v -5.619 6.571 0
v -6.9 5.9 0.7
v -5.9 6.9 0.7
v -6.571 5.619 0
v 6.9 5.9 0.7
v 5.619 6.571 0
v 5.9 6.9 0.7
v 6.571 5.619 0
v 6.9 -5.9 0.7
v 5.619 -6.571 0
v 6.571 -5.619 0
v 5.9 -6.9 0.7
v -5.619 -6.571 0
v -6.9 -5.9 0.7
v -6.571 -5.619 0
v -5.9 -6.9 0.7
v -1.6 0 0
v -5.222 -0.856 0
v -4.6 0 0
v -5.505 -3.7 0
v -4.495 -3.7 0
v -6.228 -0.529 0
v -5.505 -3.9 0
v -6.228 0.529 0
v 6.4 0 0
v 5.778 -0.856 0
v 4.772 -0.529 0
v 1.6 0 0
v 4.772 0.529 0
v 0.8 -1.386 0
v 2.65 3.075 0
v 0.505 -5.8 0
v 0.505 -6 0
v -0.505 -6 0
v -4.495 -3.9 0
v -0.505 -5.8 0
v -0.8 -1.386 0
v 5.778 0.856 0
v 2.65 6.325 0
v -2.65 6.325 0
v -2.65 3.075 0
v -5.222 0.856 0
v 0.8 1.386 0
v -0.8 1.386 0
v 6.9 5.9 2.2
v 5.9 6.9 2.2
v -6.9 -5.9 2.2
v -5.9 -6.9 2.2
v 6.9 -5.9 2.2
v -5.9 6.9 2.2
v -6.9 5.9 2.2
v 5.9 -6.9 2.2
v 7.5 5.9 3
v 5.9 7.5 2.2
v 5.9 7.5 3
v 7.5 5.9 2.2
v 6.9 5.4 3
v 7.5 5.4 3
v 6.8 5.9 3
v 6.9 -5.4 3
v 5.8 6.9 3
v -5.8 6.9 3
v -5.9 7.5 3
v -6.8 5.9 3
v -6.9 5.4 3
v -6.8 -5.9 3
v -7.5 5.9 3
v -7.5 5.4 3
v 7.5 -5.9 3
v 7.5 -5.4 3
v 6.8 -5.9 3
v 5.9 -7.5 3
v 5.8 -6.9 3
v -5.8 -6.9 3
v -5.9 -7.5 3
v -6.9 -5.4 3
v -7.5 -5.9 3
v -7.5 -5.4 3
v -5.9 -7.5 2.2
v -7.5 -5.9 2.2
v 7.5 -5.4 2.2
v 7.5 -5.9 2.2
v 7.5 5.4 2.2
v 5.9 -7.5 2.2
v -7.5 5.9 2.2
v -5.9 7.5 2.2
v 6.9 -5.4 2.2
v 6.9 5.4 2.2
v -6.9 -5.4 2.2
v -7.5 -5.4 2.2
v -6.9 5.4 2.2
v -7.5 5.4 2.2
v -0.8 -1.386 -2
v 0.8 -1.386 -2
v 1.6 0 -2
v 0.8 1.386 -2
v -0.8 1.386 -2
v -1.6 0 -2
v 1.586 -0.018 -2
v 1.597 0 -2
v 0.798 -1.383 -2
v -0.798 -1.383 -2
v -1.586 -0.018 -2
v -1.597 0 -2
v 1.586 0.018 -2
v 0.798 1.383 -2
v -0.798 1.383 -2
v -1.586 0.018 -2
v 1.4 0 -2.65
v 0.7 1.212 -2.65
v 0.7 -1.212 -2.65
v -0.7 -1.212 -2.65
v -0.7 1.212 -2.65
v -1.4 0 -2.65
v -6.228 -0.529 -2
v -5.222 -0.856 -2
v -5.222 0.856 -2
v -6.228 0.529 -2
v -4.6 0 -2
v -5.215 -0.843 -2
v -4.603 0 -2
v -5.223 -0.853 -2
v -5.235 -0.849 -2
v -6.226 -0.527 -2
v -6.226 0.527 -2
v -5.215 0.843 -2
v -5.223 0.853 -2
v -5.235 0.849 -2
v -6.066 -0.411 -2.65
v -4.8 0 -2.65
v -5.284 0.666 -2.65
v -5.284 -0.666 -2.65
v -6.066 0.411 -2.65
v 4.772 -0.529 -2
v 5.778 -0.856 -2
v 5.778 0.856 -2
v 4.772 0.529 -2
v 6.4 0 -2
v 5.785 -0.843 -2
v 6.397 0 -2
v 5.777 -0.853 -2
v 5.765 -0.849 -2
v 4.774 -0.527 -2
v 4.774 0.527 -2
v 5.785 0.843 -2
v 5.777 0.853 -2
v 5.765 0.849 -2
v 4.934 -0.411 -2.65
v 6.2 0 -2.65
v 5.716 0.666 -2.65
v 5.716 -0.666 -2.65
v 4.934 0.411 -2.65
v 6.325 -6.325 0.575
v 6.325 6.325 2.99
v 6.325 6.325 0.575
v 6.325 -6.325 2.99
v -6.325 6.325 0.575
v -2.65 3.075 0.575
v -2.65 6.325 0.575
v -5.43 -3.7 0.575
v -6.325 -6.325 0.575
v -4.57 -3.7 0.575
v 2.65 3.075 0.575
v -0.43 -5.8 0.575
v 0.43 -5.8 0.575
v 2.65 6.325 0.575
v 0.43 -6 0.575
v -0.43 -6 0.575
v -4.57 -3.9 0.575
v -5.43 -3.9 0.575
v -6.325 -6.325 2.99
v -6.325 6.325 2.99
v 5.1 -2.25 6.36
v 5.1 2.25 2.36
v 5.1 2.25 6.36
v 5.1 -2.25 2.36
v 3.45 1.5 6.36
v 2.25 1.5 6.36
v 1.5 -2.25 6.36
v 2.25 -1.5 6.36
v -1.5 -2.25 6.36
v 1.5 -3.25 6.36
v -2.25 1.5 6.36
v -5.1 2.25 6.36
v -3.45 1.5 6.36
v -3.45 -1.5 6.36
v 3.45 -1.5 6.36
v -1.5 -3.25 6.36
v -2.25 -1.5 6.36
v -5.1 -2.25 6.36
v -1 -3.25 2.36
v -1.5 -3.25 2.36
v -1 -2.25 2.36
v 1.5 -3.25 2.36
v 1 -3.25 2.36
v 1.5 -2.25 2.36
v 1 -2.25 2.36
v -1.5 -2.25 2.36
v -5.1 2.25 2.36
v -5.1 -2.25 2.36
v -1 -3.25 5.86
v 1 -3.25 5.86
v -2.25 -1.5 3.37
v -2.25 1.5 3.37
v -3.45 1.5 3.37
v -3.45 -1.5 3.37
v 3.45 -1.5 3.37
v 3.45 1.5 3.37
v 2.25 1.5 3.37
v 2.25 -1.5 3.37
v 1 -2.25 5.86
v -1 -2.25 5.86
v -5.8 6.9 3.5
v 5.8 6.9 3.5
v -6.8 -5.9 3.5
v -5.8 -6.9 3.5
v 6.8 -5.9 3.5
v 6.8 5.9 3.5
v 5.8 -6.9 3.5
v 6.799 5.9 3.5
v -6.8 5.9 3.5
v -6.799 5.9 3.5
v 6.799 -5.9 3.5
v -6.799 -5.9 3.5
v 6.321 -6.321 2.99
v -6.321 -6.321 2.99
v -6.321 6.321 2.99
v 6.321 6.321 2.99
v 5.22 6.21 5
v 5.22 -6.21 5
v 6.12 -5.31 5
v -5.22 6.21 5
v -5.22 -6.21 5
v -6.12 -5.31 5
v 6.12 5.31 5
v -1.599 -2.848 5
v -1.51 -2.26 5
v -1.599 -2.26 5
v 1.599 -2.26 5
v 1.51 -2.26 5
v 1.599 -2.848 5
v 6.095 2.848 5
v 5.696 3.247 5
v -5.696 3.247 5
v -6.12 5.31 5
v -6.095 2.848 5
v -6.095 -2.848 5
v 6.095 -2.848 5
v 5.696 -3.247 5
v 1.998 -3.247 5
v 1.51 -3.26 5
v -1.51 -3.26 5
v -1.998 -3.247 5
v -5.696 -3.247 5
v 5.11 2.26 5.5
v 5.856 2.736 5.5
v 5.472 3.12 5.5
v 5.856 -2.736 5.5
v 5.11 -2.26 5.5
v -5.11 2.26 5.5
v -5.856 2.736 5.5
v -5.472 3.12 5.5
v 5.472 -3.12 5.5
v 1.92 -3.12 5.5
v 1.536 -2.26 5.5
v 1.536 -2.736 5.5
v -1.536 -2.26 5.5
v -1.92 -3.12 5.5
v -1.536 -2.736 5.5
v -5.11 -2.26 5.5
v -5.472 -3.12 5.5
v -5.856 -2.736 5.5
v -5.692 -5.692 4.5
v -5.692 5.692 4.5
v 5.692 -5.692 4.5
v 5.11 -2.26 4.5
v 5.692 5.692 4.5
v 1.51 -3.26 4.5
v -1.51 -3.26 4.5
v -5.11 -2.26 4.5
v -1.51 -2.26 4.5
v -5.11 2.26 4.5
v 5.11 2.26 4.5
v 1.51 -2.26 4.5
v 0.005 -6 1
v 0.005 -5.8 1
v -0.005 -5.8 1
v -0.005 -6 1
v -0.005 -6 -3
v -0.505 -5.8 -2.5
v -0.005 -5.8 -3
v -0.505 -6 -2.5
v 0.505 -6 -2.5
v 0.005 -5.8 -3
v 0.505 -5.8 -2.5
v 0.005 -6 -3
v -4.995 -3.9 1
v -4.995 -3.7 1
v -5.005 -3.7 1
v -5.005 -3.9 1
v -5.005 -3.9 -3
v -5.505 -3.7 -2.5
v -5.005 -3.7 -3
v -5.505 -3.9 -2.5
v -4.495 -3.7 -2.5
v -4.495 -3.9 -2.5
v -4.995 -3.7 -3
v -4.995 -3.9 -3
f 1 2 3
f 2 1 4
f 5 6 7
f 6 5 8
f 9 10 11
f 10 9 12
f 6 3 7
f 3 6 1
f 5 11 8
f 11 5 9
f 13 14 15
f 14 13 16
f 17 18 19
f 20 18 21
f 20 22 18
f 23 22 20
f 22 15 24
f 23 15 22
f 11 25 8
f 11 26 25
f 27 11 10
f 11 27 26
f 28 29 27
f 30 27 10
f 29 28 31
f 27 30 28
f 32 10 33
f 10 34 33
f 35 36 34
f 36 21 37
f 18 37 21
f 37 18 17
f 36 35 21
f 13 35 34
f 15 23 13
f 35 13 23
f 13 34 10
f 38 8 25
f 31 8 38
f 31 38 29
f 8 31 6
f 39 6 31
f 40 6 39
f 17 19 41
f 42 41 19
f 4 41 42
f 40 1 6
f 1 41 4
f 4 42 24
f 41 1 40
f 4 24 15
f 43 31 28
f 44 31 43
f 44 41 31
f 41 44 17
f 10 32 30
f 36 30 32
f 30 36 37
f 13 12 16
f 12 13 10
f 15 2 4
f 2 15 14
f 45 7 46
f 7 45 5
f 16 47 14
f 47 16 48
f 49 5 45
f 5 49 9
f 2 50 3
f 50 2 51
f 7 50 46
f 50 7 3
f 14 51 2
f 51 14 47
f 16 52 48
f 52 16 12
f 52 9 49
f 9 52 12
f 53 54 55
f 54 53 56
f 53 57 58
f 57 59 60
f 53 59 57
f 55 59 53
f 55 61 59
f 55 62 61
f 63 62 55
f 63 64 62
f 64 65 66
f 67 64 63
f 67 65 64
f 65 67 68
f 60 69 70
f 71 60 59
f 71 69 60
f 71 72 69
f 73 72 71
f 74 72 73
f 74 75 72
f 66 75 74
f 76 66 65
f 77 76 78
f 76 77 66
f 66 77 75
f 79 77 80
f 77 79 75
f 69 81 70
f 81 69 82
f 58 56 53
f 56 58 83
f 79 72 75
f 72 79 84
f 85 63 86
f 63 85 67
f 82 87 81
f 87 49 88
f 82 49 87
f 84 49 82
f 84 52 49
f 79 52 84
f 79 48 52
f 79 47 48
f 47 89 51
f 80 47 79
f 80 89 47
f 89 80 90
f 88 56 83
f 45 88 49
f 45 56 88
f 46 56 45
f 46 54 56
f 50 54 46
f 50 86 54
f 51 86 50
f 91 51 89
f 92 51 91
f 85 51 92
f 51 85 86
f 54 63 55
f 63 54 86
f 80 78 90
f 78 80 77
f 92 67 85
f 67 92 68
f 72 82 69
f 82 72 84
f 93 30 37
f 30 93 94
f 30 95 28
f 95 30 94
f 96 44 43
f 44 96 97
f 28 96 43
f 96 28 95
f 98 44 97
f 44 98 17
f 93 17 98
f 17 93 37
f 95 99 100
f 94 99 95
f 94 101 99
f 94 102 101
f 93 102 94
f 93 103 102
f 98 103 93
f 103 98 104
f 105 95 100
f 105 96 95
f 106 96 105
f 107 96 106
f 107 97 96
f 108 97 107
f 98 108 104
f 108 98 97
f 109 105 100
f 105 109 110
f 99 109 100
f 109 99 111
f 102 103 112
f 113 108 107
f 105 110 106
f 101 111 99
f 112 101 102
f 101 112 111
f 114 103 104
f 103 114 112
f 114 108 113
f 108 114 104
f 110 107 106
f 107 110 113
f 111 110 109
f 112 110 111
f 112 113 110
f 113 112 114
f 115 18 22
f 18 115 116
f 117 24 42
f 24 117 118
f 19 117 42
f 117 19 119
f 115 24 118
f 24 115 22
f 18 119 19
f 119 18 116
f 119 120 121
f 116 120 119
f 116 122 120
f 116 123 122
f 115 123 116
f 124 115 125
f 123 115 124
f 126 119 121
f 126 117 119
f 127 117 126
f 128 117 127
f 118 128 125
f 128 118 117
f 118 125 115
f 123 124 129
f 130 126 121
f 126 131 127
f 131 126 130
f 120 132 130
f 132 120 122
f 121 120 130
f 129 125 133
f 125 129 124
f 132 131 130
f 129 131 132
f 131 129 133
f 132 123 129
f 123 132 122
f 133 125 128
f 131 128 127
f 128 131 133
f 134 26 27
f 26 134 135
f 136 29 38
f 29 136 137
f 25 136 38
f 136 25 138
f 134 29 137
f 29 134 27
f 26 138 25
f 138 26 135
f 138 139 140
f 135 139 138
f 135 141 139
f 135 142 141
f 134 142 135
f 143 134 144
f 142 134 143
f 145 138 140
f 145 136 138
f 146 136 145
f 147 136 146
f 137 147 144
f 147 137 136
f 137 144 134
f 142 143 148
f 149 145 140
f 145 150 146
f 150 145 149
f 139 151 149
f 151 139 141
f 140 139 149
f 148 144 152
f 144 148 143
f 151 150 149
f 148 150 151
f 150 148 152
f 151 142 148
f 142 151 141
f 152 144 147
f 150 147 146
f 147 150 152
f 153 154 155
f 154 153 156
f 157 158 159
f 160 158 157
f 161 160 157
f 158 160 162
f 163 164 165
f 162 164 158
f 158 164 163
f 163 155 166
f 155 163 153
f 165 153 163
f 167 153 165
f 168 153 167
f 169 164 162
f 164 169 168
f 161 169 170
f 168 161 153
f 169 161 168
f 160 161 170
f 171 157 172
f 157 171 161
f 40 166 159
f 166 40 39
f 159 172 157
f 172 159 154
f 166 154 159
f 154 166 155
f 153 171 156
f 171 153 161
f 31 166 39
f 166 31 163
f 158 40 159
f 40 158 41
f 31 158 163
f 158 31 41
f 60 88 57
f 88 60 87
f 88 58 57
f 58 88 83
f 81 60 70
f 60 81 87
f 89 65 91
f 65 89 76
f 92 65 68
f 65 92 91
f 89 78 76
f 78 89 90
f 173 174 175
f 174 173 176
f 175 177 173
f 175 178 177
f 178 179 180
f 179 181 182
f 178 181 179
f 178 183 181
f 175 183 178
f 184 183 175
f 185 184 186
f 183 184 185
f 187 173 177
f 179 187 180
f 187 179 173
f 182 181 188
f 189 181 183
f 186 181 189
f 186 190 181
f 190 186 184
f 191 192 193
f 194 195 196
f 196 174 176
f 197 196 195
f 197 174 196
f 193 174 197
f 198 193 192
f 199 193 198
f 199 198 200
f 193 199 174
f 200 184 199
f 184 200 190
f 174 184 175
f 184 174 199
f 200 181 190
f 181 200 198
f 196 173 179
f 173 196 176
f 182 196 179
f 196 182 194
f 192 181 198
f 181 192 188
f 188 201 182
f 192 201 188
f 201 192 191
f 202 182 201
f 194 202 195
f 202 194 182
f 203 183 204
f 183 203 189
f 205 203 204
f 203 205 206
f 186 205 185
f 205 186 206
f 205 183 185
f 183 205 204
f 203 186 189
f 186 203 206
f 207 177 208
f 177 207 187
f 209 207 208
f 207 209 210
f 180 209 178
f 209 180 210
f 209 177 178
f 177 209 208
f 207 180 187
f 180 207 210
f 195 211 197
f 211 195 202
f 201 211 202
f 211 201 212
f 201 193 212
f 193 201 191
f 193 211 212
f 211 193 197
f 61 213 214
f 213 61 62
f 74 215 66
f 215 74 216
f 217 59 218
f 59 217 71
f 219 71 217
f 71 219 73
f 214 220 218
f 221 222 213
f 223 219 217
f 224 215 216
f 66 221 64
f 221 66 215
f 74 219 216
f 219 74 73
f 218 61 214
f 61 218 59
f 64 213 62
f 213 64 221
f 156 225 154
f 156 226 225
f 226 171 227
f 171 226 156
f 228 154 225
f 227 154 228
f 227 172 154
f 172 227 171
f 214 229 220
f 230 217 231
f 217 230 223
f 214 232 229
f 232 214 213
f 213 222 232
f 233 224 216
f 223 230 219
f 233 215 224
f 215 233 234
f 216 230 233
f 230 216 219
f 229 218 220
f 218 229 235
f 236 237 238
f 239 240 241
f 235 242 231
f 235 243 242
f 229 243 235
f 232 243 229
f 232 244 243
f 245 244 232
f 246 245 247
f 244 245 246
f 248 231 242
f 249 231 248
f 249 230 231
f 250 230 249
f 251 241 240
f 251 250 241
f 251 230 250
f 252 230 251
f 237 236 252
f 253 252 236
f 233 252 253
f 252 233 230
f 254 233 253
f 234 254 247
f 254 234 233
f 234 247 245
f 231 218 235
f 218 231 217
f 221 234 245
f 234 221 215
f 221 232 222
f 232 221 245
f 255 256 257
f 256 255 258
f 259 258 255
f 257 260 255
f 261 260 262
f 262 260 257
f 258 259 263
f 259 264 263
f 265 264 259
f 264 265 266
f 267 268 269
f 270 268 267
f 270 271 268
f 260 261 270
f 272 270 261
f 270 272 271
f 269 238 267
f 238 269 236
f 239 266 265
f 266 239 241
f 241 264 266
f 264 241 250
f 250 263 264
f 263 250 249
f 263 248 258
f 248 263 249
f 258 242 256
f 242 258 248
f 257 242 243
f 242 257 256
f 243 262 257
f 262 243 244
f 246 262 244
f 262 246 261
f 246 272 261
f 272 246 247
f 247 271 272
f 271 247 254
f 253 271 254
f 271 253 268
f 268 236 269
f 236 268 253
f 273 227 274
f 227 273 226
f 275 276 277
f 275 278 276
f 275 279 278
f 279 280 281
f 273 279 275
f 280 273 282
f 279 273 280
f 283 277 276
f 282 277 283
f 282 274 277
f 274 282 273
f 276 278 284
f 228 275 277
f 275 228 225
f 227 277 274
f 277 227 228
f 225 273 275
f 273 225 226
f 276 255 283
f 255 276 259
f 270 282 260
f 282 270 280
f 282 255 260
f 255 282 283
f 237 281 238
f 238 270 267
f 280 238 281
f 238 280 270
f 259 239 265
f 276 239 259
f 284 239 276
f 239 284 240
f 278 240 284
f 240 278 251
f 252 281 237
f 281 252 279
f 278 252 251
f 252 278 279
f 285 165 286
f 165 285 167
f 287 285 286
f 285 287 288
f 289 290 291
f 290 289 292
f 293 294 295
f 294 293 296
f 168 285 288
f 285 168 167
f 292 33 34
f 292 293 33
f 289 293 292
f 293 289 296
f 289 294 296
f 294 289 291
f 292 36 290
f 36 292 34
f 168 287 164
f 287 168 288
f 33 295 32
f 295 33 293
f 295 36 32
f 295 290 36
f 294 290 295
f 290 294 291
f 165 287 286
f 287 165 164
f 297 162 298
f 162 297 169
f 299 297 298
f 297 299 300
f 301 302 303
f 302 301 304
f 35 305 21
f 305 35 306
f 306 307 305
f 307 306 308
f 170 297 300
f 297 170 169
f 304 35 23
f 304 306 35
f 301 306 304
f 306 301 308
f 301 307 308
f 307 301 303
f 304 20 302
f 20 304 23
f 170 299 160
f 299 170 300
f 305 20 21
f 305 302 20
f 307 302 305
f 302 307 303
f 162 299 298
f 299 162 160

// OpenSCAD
/*******************************************************************************\
|						Kailh Choc V1 and V2 switch models.						|
|							Copyright 2026 Felix Kuehling 						|
|																				|
|	This program is free software: you can redistribute it and/or modify		|
|	it under the terms of the GNU General Public License as published by		|
|	the Free Software Foundation, either version 3 of the License, or			|
|	(at your option) any later version.											|
|	This program is distributed in the hope that it will be useful,				|
|	but WITHOUT ANY WARRANTY; without even the implied warranty of				|
|	MERCHANTABILITY or FITNESS FOR A PARTICULAR PURPOSE.  See the				|
|	GNU General Public License for more details.								|
|	You should have received a copy of the GNU General Public License			|
|	along with this program.  If not, see <https://www.gnu.org/licenses/>.		|
|																				|
\*******************************************************************************/

travel = 3.3 * (0.5 * sin ( 360 * $t) + 0.5);
$color_scheme = 6;
$choc_version = 1;

choc_switch();
//choc_switch_v1 ( bottom_color, top_color, stem_color );

module choc_switch_v1(bottom_color, top_color, stem_color,travel=travel) {
    color(bottom_color) render(convexity = 4) difference() {
        union() {
            linear_extrude(height = 0.701, scale = 1.05) {
                offset(r = 1.0/1.05) square(11.8/1.05, center = true);
            }
            translate([0, 0, 0.7]) linear_extrude(height = 1.51) {
                offset(r = 1.0) square(11.8, center = true);
            }
            translate([0, 0, 2.2]) linear_extrude(height = 0.8) {
                offset(r = 1.6) square(11.8, center = true);
            }
            translate([0, 0, -2]) cylinder(h = 2.01, d = 3.2);
            translate([0, 0, -2.65]) cylinder(h = 0.66, d1 = 2.8, d2 = 3.2);
            translate([-5.5, 0, -2   ]) cylinder(h = 2.01, d = 1.8);
            translate([-5.5, 0, -2.65]) cylinder(h = 0.66, d1 = 1.4, d2 = 1.8);
            translate([ 5.5, 0, -2   ]) cylinder(h = 2.01, d = 1.8);
            translate([ 5.5, 0, -2.65]) cylinder(h = 0.66, d1 = 1.4, d2 = 1.8);
        }
        translate([0, 0, 6.9]) cube(12.65, center = true);
        translate([0, 4.7, 0]) cube([5.3, 3.25, 2], center = true);
        translate([7.4, 0, 2.5]) cube([1, 10.8, 1], center = true);
        translate([-7.4, 0, 2.5]) cube([1, 10.8, 1], center = true);
    }
    color("gold") translate([0, -5.9, -1]) rotate([90, 0, 0])
    linear_extrude(height = 0.2, center = true) {
        offset(r = 0.5) square([0.01, 3], center = true);
    }
    color("silver") translate([-5, -3.8, -1]) rotate([90, 0, 0])
    linear_extrude(height = 0.2, center = true) {
        offset(r = 0.5) square([0.01, 3], center = true);
    }
    color(stem_color) translate([0, 0, 5+1.01-travel]) render(convexity = 4) difference() {
        union() {
            cube([10.2, 4.5, 4], center = true);
            translate([0, -2.74, 0]) cube([3, 1.02, 4], center = true);
        }
        translate([-2.85, 0, 0.51]) cube([1.2, 3, 3], center = true);
        translate([ 2.85, 0, 0.51]) cube([1.2, 3, 3], center = true);
        translate([0, -2.76, -0.5]) cube([2, 1.02, 4], center = true);
    }
    color(top_color, 0.3) render(convexity = 4) difference() {
        union() {
            translate([0, 0, 2.99])
            linear_extrude(height = 0.51) {
                offset(r = 1.0) square([11.6, 11.8], center = true);
            }
            translate([0, 0, 3.499])
            linear_extrude(height = 1.501, scale = 0.9) {
                offset(r = 1.0) square([11.6, 11.8], center = true);
            }
            translate([0, 0, 4.99])
            linear_extrude(height = 0.51, convexity = 2, scale = 0.96) {
                offset(r = 0.4) polygon([
                [-5.7, -2.85], [-5.7,  2.85], [ 5.7,  2.85], [ 5.7, -2.85],
                [ 2.0, -2.85], [ 2.0, -1.85], [-2.0, -1.85], [-2.0, -2.85]
                ]);
            }
        }
        translate([0, 0, 2.98])
        linear_extrude(height = 1.52, scale = 0.9) {
            square(12.65, center = true);
        }
        translate([0, 0, 5]) cube([10.22, 4.52, 2], center = true);
        translate([0, -2.74, 5]) cube([3.02, 1.04, 2], center = true);
    }
}

module choc_switch_v2(bottom_color, top_color, stem_color, travel=travel) {
    color(bottom_color) render(convexity = 4) difference() {
        union() {
            linear_extrude(height = 0.701, scale = 1.05) {
                offset(r = 1.0/1.05) square(11.95/1.05, center = true);
            }
            translate([0, 0, 0.7]) linear_extrude(height = 1.51) {
                offset(r = 1.0) square(11.95, center = true);
            }
            translate([0, 0, 2.2]) linear_extrude(height = 0.8) {
                offset(r = 1.5) square(12.0, center = true);
            }
            translate([0, 0, -2]) cylinder(h = 2.01, d = 4.8);
            translate([0, 0, -2.65]) cylinder(h = 0.66, d1 = 2.8, d2 = 4.8);
        }
        translate([0, 0, 6.9]) cube(12.8, center = true);
        translate([0, 4.7, 0]) cube([5.3, 3.25, 2], center = true);
        translate([7.475, 0, 2.5]) cube([1, 10.8, 1], center = true);
        translate([-7.475, 0, 2.5]) cube([1, 10.8, 1], center = true);
    }
    color("gold") translate([0, -5.9, -1]) rotate([90, 0, 0])
    linear_extrude(height = 0.2, center = true) {
        offset(r = 0.5) square([0.01, 3], center = true);
    }
    color("silver") translate([-5, -3.8, -1]) rotate([90, 0, 0])
    linear_extrude(height = 0.2, center = true) {
        offset(r = 0.5) square([0.01, 3], center = true);
    }
    color("silver") translate([5, 5.15, -1]) rotate([90, 0, 0])
    linear_extrude(height = 0.2, center = true) {
        offset(r = 0.5) square([0.01, 3], center = true);
    }
    color(stem_color) translate([0, 0, 5.3+3.3-2-travel]) render(convexity = 4)
    union() {
        difference() {
            cylinder(h=4, d=6.5, center=true);
            translate([0, 0, 0.4]) cylinder(h=4, d=5.6, center=true);
        }
        cube([4, 1.1, 4], center=true);
        cube([1.3, 4, 4], center=true);
    }
    color(top_color, 0.3) render(convexity = 4) difference() {
        union() {
            translate([0, 0, 2.99])
            linear_extrude(height = 0.81) {
                offset(r = 1.0) square(11.95, center = true);
            }
            translate([0, 0, 3.799])
            linear_extrude(height = 1.501, scale = 0.9) {
                offset(r = 1.0) square(11.95, center = true);
            }
        }
        translate([0, 0, 2.98])
        linear_extrude(height = 1.82, scale = 0.9) {
            square(12.8, center = true);
        }
        translate([0, 0, 5]) cylinder(h=2, d=6.6, center=true);
    }
}

module choc_switch(travel=travel) {
    bottom_color =
        $color_scheme == 1 ? "mediumblue" :
        $color_scheme == 2 ? "dimgrey" :
        $color_scheme == 3 ? "red" :
        $color_scheme == 4 ? "lightgrey" :
        $color_scheme == 5 ? "#9ef" :
        $color_scheme == 6 ? "#333" :
        $color_scheme == 7 ? "#333" :
        $color_scheme == 8 ? "#333" :
        $color_scheme == 9 ? "#333" :
        $color_scheme ==10 ? "darkblue" :
                             "dimgrey";
    top_color =
        $color_scheme == 1 ? "white" :
        $color_scheme == 2 ? "white" :
        $color_scheme == 3 ? "white" :
        $color_scheme == 4 ? "white" :
        $color_scheme == 5 ? "white" :
        $color_scheme == 6 ? "#333" :
        $color_scheme == 7 ? "#383034" :
        $color_scheme == 8 ? "#383034" :
        $color_scheme == 9 ? "#412" :
        $color_scheme ==10 ? "deepskyblue" :
                             "white";
    stem_color =
        $color_scheme == 1 ? "deepskyblue" :
        $color_scheme == 2 ? "sienna" :
        $color_scheme == 3 ? "white" :
        $color_scheme == 4 ? "lightpink" :
        $color_scheme == 5 ? "#9ff" :
        $color_scheme == 6 ? "darkorange" :
        $color_scheme == 7 ? "lightgreen" :
        $color_scheme == 8 ? "#222" :
        $color_scheme == 9 ? "lightsalmon" :
        $color_scheme ==10 ? "red" :
                             "red";

    if ($choc_version == 2)
        choc_switch_v2(bottom_color, top_color, stem_color, travel=travel);
    else
        choc_switch_v1(bottom_color, top_color, stem_color, travel=travel);
}

// Expanded switch-top for cutting away from key-cap bottom
module switch_top(margin = 0.1) {
    size       = $choc_version == 2 ? [11.95, 11.95] : [11.6, 11.8];
    max_travel = $choc_version == 2 ? 3.3 : 3;
    insertion = ($choc_version == 2 ? $droop : $droop - 0.5) + margin;
    $fn = 20;

    translate([0, 0, insertion - 10])
        linear_extrude(height = 8.5) {
            offset(r = 1.0 + margin) square(size, center = true);
        }
    translate([0, 0, insertion - 1.501])
        linear_extrude(height = 1.501, scale = 0.9) {
            offset(r = 1.0 + margin) square(size, center = true);
        }
}
